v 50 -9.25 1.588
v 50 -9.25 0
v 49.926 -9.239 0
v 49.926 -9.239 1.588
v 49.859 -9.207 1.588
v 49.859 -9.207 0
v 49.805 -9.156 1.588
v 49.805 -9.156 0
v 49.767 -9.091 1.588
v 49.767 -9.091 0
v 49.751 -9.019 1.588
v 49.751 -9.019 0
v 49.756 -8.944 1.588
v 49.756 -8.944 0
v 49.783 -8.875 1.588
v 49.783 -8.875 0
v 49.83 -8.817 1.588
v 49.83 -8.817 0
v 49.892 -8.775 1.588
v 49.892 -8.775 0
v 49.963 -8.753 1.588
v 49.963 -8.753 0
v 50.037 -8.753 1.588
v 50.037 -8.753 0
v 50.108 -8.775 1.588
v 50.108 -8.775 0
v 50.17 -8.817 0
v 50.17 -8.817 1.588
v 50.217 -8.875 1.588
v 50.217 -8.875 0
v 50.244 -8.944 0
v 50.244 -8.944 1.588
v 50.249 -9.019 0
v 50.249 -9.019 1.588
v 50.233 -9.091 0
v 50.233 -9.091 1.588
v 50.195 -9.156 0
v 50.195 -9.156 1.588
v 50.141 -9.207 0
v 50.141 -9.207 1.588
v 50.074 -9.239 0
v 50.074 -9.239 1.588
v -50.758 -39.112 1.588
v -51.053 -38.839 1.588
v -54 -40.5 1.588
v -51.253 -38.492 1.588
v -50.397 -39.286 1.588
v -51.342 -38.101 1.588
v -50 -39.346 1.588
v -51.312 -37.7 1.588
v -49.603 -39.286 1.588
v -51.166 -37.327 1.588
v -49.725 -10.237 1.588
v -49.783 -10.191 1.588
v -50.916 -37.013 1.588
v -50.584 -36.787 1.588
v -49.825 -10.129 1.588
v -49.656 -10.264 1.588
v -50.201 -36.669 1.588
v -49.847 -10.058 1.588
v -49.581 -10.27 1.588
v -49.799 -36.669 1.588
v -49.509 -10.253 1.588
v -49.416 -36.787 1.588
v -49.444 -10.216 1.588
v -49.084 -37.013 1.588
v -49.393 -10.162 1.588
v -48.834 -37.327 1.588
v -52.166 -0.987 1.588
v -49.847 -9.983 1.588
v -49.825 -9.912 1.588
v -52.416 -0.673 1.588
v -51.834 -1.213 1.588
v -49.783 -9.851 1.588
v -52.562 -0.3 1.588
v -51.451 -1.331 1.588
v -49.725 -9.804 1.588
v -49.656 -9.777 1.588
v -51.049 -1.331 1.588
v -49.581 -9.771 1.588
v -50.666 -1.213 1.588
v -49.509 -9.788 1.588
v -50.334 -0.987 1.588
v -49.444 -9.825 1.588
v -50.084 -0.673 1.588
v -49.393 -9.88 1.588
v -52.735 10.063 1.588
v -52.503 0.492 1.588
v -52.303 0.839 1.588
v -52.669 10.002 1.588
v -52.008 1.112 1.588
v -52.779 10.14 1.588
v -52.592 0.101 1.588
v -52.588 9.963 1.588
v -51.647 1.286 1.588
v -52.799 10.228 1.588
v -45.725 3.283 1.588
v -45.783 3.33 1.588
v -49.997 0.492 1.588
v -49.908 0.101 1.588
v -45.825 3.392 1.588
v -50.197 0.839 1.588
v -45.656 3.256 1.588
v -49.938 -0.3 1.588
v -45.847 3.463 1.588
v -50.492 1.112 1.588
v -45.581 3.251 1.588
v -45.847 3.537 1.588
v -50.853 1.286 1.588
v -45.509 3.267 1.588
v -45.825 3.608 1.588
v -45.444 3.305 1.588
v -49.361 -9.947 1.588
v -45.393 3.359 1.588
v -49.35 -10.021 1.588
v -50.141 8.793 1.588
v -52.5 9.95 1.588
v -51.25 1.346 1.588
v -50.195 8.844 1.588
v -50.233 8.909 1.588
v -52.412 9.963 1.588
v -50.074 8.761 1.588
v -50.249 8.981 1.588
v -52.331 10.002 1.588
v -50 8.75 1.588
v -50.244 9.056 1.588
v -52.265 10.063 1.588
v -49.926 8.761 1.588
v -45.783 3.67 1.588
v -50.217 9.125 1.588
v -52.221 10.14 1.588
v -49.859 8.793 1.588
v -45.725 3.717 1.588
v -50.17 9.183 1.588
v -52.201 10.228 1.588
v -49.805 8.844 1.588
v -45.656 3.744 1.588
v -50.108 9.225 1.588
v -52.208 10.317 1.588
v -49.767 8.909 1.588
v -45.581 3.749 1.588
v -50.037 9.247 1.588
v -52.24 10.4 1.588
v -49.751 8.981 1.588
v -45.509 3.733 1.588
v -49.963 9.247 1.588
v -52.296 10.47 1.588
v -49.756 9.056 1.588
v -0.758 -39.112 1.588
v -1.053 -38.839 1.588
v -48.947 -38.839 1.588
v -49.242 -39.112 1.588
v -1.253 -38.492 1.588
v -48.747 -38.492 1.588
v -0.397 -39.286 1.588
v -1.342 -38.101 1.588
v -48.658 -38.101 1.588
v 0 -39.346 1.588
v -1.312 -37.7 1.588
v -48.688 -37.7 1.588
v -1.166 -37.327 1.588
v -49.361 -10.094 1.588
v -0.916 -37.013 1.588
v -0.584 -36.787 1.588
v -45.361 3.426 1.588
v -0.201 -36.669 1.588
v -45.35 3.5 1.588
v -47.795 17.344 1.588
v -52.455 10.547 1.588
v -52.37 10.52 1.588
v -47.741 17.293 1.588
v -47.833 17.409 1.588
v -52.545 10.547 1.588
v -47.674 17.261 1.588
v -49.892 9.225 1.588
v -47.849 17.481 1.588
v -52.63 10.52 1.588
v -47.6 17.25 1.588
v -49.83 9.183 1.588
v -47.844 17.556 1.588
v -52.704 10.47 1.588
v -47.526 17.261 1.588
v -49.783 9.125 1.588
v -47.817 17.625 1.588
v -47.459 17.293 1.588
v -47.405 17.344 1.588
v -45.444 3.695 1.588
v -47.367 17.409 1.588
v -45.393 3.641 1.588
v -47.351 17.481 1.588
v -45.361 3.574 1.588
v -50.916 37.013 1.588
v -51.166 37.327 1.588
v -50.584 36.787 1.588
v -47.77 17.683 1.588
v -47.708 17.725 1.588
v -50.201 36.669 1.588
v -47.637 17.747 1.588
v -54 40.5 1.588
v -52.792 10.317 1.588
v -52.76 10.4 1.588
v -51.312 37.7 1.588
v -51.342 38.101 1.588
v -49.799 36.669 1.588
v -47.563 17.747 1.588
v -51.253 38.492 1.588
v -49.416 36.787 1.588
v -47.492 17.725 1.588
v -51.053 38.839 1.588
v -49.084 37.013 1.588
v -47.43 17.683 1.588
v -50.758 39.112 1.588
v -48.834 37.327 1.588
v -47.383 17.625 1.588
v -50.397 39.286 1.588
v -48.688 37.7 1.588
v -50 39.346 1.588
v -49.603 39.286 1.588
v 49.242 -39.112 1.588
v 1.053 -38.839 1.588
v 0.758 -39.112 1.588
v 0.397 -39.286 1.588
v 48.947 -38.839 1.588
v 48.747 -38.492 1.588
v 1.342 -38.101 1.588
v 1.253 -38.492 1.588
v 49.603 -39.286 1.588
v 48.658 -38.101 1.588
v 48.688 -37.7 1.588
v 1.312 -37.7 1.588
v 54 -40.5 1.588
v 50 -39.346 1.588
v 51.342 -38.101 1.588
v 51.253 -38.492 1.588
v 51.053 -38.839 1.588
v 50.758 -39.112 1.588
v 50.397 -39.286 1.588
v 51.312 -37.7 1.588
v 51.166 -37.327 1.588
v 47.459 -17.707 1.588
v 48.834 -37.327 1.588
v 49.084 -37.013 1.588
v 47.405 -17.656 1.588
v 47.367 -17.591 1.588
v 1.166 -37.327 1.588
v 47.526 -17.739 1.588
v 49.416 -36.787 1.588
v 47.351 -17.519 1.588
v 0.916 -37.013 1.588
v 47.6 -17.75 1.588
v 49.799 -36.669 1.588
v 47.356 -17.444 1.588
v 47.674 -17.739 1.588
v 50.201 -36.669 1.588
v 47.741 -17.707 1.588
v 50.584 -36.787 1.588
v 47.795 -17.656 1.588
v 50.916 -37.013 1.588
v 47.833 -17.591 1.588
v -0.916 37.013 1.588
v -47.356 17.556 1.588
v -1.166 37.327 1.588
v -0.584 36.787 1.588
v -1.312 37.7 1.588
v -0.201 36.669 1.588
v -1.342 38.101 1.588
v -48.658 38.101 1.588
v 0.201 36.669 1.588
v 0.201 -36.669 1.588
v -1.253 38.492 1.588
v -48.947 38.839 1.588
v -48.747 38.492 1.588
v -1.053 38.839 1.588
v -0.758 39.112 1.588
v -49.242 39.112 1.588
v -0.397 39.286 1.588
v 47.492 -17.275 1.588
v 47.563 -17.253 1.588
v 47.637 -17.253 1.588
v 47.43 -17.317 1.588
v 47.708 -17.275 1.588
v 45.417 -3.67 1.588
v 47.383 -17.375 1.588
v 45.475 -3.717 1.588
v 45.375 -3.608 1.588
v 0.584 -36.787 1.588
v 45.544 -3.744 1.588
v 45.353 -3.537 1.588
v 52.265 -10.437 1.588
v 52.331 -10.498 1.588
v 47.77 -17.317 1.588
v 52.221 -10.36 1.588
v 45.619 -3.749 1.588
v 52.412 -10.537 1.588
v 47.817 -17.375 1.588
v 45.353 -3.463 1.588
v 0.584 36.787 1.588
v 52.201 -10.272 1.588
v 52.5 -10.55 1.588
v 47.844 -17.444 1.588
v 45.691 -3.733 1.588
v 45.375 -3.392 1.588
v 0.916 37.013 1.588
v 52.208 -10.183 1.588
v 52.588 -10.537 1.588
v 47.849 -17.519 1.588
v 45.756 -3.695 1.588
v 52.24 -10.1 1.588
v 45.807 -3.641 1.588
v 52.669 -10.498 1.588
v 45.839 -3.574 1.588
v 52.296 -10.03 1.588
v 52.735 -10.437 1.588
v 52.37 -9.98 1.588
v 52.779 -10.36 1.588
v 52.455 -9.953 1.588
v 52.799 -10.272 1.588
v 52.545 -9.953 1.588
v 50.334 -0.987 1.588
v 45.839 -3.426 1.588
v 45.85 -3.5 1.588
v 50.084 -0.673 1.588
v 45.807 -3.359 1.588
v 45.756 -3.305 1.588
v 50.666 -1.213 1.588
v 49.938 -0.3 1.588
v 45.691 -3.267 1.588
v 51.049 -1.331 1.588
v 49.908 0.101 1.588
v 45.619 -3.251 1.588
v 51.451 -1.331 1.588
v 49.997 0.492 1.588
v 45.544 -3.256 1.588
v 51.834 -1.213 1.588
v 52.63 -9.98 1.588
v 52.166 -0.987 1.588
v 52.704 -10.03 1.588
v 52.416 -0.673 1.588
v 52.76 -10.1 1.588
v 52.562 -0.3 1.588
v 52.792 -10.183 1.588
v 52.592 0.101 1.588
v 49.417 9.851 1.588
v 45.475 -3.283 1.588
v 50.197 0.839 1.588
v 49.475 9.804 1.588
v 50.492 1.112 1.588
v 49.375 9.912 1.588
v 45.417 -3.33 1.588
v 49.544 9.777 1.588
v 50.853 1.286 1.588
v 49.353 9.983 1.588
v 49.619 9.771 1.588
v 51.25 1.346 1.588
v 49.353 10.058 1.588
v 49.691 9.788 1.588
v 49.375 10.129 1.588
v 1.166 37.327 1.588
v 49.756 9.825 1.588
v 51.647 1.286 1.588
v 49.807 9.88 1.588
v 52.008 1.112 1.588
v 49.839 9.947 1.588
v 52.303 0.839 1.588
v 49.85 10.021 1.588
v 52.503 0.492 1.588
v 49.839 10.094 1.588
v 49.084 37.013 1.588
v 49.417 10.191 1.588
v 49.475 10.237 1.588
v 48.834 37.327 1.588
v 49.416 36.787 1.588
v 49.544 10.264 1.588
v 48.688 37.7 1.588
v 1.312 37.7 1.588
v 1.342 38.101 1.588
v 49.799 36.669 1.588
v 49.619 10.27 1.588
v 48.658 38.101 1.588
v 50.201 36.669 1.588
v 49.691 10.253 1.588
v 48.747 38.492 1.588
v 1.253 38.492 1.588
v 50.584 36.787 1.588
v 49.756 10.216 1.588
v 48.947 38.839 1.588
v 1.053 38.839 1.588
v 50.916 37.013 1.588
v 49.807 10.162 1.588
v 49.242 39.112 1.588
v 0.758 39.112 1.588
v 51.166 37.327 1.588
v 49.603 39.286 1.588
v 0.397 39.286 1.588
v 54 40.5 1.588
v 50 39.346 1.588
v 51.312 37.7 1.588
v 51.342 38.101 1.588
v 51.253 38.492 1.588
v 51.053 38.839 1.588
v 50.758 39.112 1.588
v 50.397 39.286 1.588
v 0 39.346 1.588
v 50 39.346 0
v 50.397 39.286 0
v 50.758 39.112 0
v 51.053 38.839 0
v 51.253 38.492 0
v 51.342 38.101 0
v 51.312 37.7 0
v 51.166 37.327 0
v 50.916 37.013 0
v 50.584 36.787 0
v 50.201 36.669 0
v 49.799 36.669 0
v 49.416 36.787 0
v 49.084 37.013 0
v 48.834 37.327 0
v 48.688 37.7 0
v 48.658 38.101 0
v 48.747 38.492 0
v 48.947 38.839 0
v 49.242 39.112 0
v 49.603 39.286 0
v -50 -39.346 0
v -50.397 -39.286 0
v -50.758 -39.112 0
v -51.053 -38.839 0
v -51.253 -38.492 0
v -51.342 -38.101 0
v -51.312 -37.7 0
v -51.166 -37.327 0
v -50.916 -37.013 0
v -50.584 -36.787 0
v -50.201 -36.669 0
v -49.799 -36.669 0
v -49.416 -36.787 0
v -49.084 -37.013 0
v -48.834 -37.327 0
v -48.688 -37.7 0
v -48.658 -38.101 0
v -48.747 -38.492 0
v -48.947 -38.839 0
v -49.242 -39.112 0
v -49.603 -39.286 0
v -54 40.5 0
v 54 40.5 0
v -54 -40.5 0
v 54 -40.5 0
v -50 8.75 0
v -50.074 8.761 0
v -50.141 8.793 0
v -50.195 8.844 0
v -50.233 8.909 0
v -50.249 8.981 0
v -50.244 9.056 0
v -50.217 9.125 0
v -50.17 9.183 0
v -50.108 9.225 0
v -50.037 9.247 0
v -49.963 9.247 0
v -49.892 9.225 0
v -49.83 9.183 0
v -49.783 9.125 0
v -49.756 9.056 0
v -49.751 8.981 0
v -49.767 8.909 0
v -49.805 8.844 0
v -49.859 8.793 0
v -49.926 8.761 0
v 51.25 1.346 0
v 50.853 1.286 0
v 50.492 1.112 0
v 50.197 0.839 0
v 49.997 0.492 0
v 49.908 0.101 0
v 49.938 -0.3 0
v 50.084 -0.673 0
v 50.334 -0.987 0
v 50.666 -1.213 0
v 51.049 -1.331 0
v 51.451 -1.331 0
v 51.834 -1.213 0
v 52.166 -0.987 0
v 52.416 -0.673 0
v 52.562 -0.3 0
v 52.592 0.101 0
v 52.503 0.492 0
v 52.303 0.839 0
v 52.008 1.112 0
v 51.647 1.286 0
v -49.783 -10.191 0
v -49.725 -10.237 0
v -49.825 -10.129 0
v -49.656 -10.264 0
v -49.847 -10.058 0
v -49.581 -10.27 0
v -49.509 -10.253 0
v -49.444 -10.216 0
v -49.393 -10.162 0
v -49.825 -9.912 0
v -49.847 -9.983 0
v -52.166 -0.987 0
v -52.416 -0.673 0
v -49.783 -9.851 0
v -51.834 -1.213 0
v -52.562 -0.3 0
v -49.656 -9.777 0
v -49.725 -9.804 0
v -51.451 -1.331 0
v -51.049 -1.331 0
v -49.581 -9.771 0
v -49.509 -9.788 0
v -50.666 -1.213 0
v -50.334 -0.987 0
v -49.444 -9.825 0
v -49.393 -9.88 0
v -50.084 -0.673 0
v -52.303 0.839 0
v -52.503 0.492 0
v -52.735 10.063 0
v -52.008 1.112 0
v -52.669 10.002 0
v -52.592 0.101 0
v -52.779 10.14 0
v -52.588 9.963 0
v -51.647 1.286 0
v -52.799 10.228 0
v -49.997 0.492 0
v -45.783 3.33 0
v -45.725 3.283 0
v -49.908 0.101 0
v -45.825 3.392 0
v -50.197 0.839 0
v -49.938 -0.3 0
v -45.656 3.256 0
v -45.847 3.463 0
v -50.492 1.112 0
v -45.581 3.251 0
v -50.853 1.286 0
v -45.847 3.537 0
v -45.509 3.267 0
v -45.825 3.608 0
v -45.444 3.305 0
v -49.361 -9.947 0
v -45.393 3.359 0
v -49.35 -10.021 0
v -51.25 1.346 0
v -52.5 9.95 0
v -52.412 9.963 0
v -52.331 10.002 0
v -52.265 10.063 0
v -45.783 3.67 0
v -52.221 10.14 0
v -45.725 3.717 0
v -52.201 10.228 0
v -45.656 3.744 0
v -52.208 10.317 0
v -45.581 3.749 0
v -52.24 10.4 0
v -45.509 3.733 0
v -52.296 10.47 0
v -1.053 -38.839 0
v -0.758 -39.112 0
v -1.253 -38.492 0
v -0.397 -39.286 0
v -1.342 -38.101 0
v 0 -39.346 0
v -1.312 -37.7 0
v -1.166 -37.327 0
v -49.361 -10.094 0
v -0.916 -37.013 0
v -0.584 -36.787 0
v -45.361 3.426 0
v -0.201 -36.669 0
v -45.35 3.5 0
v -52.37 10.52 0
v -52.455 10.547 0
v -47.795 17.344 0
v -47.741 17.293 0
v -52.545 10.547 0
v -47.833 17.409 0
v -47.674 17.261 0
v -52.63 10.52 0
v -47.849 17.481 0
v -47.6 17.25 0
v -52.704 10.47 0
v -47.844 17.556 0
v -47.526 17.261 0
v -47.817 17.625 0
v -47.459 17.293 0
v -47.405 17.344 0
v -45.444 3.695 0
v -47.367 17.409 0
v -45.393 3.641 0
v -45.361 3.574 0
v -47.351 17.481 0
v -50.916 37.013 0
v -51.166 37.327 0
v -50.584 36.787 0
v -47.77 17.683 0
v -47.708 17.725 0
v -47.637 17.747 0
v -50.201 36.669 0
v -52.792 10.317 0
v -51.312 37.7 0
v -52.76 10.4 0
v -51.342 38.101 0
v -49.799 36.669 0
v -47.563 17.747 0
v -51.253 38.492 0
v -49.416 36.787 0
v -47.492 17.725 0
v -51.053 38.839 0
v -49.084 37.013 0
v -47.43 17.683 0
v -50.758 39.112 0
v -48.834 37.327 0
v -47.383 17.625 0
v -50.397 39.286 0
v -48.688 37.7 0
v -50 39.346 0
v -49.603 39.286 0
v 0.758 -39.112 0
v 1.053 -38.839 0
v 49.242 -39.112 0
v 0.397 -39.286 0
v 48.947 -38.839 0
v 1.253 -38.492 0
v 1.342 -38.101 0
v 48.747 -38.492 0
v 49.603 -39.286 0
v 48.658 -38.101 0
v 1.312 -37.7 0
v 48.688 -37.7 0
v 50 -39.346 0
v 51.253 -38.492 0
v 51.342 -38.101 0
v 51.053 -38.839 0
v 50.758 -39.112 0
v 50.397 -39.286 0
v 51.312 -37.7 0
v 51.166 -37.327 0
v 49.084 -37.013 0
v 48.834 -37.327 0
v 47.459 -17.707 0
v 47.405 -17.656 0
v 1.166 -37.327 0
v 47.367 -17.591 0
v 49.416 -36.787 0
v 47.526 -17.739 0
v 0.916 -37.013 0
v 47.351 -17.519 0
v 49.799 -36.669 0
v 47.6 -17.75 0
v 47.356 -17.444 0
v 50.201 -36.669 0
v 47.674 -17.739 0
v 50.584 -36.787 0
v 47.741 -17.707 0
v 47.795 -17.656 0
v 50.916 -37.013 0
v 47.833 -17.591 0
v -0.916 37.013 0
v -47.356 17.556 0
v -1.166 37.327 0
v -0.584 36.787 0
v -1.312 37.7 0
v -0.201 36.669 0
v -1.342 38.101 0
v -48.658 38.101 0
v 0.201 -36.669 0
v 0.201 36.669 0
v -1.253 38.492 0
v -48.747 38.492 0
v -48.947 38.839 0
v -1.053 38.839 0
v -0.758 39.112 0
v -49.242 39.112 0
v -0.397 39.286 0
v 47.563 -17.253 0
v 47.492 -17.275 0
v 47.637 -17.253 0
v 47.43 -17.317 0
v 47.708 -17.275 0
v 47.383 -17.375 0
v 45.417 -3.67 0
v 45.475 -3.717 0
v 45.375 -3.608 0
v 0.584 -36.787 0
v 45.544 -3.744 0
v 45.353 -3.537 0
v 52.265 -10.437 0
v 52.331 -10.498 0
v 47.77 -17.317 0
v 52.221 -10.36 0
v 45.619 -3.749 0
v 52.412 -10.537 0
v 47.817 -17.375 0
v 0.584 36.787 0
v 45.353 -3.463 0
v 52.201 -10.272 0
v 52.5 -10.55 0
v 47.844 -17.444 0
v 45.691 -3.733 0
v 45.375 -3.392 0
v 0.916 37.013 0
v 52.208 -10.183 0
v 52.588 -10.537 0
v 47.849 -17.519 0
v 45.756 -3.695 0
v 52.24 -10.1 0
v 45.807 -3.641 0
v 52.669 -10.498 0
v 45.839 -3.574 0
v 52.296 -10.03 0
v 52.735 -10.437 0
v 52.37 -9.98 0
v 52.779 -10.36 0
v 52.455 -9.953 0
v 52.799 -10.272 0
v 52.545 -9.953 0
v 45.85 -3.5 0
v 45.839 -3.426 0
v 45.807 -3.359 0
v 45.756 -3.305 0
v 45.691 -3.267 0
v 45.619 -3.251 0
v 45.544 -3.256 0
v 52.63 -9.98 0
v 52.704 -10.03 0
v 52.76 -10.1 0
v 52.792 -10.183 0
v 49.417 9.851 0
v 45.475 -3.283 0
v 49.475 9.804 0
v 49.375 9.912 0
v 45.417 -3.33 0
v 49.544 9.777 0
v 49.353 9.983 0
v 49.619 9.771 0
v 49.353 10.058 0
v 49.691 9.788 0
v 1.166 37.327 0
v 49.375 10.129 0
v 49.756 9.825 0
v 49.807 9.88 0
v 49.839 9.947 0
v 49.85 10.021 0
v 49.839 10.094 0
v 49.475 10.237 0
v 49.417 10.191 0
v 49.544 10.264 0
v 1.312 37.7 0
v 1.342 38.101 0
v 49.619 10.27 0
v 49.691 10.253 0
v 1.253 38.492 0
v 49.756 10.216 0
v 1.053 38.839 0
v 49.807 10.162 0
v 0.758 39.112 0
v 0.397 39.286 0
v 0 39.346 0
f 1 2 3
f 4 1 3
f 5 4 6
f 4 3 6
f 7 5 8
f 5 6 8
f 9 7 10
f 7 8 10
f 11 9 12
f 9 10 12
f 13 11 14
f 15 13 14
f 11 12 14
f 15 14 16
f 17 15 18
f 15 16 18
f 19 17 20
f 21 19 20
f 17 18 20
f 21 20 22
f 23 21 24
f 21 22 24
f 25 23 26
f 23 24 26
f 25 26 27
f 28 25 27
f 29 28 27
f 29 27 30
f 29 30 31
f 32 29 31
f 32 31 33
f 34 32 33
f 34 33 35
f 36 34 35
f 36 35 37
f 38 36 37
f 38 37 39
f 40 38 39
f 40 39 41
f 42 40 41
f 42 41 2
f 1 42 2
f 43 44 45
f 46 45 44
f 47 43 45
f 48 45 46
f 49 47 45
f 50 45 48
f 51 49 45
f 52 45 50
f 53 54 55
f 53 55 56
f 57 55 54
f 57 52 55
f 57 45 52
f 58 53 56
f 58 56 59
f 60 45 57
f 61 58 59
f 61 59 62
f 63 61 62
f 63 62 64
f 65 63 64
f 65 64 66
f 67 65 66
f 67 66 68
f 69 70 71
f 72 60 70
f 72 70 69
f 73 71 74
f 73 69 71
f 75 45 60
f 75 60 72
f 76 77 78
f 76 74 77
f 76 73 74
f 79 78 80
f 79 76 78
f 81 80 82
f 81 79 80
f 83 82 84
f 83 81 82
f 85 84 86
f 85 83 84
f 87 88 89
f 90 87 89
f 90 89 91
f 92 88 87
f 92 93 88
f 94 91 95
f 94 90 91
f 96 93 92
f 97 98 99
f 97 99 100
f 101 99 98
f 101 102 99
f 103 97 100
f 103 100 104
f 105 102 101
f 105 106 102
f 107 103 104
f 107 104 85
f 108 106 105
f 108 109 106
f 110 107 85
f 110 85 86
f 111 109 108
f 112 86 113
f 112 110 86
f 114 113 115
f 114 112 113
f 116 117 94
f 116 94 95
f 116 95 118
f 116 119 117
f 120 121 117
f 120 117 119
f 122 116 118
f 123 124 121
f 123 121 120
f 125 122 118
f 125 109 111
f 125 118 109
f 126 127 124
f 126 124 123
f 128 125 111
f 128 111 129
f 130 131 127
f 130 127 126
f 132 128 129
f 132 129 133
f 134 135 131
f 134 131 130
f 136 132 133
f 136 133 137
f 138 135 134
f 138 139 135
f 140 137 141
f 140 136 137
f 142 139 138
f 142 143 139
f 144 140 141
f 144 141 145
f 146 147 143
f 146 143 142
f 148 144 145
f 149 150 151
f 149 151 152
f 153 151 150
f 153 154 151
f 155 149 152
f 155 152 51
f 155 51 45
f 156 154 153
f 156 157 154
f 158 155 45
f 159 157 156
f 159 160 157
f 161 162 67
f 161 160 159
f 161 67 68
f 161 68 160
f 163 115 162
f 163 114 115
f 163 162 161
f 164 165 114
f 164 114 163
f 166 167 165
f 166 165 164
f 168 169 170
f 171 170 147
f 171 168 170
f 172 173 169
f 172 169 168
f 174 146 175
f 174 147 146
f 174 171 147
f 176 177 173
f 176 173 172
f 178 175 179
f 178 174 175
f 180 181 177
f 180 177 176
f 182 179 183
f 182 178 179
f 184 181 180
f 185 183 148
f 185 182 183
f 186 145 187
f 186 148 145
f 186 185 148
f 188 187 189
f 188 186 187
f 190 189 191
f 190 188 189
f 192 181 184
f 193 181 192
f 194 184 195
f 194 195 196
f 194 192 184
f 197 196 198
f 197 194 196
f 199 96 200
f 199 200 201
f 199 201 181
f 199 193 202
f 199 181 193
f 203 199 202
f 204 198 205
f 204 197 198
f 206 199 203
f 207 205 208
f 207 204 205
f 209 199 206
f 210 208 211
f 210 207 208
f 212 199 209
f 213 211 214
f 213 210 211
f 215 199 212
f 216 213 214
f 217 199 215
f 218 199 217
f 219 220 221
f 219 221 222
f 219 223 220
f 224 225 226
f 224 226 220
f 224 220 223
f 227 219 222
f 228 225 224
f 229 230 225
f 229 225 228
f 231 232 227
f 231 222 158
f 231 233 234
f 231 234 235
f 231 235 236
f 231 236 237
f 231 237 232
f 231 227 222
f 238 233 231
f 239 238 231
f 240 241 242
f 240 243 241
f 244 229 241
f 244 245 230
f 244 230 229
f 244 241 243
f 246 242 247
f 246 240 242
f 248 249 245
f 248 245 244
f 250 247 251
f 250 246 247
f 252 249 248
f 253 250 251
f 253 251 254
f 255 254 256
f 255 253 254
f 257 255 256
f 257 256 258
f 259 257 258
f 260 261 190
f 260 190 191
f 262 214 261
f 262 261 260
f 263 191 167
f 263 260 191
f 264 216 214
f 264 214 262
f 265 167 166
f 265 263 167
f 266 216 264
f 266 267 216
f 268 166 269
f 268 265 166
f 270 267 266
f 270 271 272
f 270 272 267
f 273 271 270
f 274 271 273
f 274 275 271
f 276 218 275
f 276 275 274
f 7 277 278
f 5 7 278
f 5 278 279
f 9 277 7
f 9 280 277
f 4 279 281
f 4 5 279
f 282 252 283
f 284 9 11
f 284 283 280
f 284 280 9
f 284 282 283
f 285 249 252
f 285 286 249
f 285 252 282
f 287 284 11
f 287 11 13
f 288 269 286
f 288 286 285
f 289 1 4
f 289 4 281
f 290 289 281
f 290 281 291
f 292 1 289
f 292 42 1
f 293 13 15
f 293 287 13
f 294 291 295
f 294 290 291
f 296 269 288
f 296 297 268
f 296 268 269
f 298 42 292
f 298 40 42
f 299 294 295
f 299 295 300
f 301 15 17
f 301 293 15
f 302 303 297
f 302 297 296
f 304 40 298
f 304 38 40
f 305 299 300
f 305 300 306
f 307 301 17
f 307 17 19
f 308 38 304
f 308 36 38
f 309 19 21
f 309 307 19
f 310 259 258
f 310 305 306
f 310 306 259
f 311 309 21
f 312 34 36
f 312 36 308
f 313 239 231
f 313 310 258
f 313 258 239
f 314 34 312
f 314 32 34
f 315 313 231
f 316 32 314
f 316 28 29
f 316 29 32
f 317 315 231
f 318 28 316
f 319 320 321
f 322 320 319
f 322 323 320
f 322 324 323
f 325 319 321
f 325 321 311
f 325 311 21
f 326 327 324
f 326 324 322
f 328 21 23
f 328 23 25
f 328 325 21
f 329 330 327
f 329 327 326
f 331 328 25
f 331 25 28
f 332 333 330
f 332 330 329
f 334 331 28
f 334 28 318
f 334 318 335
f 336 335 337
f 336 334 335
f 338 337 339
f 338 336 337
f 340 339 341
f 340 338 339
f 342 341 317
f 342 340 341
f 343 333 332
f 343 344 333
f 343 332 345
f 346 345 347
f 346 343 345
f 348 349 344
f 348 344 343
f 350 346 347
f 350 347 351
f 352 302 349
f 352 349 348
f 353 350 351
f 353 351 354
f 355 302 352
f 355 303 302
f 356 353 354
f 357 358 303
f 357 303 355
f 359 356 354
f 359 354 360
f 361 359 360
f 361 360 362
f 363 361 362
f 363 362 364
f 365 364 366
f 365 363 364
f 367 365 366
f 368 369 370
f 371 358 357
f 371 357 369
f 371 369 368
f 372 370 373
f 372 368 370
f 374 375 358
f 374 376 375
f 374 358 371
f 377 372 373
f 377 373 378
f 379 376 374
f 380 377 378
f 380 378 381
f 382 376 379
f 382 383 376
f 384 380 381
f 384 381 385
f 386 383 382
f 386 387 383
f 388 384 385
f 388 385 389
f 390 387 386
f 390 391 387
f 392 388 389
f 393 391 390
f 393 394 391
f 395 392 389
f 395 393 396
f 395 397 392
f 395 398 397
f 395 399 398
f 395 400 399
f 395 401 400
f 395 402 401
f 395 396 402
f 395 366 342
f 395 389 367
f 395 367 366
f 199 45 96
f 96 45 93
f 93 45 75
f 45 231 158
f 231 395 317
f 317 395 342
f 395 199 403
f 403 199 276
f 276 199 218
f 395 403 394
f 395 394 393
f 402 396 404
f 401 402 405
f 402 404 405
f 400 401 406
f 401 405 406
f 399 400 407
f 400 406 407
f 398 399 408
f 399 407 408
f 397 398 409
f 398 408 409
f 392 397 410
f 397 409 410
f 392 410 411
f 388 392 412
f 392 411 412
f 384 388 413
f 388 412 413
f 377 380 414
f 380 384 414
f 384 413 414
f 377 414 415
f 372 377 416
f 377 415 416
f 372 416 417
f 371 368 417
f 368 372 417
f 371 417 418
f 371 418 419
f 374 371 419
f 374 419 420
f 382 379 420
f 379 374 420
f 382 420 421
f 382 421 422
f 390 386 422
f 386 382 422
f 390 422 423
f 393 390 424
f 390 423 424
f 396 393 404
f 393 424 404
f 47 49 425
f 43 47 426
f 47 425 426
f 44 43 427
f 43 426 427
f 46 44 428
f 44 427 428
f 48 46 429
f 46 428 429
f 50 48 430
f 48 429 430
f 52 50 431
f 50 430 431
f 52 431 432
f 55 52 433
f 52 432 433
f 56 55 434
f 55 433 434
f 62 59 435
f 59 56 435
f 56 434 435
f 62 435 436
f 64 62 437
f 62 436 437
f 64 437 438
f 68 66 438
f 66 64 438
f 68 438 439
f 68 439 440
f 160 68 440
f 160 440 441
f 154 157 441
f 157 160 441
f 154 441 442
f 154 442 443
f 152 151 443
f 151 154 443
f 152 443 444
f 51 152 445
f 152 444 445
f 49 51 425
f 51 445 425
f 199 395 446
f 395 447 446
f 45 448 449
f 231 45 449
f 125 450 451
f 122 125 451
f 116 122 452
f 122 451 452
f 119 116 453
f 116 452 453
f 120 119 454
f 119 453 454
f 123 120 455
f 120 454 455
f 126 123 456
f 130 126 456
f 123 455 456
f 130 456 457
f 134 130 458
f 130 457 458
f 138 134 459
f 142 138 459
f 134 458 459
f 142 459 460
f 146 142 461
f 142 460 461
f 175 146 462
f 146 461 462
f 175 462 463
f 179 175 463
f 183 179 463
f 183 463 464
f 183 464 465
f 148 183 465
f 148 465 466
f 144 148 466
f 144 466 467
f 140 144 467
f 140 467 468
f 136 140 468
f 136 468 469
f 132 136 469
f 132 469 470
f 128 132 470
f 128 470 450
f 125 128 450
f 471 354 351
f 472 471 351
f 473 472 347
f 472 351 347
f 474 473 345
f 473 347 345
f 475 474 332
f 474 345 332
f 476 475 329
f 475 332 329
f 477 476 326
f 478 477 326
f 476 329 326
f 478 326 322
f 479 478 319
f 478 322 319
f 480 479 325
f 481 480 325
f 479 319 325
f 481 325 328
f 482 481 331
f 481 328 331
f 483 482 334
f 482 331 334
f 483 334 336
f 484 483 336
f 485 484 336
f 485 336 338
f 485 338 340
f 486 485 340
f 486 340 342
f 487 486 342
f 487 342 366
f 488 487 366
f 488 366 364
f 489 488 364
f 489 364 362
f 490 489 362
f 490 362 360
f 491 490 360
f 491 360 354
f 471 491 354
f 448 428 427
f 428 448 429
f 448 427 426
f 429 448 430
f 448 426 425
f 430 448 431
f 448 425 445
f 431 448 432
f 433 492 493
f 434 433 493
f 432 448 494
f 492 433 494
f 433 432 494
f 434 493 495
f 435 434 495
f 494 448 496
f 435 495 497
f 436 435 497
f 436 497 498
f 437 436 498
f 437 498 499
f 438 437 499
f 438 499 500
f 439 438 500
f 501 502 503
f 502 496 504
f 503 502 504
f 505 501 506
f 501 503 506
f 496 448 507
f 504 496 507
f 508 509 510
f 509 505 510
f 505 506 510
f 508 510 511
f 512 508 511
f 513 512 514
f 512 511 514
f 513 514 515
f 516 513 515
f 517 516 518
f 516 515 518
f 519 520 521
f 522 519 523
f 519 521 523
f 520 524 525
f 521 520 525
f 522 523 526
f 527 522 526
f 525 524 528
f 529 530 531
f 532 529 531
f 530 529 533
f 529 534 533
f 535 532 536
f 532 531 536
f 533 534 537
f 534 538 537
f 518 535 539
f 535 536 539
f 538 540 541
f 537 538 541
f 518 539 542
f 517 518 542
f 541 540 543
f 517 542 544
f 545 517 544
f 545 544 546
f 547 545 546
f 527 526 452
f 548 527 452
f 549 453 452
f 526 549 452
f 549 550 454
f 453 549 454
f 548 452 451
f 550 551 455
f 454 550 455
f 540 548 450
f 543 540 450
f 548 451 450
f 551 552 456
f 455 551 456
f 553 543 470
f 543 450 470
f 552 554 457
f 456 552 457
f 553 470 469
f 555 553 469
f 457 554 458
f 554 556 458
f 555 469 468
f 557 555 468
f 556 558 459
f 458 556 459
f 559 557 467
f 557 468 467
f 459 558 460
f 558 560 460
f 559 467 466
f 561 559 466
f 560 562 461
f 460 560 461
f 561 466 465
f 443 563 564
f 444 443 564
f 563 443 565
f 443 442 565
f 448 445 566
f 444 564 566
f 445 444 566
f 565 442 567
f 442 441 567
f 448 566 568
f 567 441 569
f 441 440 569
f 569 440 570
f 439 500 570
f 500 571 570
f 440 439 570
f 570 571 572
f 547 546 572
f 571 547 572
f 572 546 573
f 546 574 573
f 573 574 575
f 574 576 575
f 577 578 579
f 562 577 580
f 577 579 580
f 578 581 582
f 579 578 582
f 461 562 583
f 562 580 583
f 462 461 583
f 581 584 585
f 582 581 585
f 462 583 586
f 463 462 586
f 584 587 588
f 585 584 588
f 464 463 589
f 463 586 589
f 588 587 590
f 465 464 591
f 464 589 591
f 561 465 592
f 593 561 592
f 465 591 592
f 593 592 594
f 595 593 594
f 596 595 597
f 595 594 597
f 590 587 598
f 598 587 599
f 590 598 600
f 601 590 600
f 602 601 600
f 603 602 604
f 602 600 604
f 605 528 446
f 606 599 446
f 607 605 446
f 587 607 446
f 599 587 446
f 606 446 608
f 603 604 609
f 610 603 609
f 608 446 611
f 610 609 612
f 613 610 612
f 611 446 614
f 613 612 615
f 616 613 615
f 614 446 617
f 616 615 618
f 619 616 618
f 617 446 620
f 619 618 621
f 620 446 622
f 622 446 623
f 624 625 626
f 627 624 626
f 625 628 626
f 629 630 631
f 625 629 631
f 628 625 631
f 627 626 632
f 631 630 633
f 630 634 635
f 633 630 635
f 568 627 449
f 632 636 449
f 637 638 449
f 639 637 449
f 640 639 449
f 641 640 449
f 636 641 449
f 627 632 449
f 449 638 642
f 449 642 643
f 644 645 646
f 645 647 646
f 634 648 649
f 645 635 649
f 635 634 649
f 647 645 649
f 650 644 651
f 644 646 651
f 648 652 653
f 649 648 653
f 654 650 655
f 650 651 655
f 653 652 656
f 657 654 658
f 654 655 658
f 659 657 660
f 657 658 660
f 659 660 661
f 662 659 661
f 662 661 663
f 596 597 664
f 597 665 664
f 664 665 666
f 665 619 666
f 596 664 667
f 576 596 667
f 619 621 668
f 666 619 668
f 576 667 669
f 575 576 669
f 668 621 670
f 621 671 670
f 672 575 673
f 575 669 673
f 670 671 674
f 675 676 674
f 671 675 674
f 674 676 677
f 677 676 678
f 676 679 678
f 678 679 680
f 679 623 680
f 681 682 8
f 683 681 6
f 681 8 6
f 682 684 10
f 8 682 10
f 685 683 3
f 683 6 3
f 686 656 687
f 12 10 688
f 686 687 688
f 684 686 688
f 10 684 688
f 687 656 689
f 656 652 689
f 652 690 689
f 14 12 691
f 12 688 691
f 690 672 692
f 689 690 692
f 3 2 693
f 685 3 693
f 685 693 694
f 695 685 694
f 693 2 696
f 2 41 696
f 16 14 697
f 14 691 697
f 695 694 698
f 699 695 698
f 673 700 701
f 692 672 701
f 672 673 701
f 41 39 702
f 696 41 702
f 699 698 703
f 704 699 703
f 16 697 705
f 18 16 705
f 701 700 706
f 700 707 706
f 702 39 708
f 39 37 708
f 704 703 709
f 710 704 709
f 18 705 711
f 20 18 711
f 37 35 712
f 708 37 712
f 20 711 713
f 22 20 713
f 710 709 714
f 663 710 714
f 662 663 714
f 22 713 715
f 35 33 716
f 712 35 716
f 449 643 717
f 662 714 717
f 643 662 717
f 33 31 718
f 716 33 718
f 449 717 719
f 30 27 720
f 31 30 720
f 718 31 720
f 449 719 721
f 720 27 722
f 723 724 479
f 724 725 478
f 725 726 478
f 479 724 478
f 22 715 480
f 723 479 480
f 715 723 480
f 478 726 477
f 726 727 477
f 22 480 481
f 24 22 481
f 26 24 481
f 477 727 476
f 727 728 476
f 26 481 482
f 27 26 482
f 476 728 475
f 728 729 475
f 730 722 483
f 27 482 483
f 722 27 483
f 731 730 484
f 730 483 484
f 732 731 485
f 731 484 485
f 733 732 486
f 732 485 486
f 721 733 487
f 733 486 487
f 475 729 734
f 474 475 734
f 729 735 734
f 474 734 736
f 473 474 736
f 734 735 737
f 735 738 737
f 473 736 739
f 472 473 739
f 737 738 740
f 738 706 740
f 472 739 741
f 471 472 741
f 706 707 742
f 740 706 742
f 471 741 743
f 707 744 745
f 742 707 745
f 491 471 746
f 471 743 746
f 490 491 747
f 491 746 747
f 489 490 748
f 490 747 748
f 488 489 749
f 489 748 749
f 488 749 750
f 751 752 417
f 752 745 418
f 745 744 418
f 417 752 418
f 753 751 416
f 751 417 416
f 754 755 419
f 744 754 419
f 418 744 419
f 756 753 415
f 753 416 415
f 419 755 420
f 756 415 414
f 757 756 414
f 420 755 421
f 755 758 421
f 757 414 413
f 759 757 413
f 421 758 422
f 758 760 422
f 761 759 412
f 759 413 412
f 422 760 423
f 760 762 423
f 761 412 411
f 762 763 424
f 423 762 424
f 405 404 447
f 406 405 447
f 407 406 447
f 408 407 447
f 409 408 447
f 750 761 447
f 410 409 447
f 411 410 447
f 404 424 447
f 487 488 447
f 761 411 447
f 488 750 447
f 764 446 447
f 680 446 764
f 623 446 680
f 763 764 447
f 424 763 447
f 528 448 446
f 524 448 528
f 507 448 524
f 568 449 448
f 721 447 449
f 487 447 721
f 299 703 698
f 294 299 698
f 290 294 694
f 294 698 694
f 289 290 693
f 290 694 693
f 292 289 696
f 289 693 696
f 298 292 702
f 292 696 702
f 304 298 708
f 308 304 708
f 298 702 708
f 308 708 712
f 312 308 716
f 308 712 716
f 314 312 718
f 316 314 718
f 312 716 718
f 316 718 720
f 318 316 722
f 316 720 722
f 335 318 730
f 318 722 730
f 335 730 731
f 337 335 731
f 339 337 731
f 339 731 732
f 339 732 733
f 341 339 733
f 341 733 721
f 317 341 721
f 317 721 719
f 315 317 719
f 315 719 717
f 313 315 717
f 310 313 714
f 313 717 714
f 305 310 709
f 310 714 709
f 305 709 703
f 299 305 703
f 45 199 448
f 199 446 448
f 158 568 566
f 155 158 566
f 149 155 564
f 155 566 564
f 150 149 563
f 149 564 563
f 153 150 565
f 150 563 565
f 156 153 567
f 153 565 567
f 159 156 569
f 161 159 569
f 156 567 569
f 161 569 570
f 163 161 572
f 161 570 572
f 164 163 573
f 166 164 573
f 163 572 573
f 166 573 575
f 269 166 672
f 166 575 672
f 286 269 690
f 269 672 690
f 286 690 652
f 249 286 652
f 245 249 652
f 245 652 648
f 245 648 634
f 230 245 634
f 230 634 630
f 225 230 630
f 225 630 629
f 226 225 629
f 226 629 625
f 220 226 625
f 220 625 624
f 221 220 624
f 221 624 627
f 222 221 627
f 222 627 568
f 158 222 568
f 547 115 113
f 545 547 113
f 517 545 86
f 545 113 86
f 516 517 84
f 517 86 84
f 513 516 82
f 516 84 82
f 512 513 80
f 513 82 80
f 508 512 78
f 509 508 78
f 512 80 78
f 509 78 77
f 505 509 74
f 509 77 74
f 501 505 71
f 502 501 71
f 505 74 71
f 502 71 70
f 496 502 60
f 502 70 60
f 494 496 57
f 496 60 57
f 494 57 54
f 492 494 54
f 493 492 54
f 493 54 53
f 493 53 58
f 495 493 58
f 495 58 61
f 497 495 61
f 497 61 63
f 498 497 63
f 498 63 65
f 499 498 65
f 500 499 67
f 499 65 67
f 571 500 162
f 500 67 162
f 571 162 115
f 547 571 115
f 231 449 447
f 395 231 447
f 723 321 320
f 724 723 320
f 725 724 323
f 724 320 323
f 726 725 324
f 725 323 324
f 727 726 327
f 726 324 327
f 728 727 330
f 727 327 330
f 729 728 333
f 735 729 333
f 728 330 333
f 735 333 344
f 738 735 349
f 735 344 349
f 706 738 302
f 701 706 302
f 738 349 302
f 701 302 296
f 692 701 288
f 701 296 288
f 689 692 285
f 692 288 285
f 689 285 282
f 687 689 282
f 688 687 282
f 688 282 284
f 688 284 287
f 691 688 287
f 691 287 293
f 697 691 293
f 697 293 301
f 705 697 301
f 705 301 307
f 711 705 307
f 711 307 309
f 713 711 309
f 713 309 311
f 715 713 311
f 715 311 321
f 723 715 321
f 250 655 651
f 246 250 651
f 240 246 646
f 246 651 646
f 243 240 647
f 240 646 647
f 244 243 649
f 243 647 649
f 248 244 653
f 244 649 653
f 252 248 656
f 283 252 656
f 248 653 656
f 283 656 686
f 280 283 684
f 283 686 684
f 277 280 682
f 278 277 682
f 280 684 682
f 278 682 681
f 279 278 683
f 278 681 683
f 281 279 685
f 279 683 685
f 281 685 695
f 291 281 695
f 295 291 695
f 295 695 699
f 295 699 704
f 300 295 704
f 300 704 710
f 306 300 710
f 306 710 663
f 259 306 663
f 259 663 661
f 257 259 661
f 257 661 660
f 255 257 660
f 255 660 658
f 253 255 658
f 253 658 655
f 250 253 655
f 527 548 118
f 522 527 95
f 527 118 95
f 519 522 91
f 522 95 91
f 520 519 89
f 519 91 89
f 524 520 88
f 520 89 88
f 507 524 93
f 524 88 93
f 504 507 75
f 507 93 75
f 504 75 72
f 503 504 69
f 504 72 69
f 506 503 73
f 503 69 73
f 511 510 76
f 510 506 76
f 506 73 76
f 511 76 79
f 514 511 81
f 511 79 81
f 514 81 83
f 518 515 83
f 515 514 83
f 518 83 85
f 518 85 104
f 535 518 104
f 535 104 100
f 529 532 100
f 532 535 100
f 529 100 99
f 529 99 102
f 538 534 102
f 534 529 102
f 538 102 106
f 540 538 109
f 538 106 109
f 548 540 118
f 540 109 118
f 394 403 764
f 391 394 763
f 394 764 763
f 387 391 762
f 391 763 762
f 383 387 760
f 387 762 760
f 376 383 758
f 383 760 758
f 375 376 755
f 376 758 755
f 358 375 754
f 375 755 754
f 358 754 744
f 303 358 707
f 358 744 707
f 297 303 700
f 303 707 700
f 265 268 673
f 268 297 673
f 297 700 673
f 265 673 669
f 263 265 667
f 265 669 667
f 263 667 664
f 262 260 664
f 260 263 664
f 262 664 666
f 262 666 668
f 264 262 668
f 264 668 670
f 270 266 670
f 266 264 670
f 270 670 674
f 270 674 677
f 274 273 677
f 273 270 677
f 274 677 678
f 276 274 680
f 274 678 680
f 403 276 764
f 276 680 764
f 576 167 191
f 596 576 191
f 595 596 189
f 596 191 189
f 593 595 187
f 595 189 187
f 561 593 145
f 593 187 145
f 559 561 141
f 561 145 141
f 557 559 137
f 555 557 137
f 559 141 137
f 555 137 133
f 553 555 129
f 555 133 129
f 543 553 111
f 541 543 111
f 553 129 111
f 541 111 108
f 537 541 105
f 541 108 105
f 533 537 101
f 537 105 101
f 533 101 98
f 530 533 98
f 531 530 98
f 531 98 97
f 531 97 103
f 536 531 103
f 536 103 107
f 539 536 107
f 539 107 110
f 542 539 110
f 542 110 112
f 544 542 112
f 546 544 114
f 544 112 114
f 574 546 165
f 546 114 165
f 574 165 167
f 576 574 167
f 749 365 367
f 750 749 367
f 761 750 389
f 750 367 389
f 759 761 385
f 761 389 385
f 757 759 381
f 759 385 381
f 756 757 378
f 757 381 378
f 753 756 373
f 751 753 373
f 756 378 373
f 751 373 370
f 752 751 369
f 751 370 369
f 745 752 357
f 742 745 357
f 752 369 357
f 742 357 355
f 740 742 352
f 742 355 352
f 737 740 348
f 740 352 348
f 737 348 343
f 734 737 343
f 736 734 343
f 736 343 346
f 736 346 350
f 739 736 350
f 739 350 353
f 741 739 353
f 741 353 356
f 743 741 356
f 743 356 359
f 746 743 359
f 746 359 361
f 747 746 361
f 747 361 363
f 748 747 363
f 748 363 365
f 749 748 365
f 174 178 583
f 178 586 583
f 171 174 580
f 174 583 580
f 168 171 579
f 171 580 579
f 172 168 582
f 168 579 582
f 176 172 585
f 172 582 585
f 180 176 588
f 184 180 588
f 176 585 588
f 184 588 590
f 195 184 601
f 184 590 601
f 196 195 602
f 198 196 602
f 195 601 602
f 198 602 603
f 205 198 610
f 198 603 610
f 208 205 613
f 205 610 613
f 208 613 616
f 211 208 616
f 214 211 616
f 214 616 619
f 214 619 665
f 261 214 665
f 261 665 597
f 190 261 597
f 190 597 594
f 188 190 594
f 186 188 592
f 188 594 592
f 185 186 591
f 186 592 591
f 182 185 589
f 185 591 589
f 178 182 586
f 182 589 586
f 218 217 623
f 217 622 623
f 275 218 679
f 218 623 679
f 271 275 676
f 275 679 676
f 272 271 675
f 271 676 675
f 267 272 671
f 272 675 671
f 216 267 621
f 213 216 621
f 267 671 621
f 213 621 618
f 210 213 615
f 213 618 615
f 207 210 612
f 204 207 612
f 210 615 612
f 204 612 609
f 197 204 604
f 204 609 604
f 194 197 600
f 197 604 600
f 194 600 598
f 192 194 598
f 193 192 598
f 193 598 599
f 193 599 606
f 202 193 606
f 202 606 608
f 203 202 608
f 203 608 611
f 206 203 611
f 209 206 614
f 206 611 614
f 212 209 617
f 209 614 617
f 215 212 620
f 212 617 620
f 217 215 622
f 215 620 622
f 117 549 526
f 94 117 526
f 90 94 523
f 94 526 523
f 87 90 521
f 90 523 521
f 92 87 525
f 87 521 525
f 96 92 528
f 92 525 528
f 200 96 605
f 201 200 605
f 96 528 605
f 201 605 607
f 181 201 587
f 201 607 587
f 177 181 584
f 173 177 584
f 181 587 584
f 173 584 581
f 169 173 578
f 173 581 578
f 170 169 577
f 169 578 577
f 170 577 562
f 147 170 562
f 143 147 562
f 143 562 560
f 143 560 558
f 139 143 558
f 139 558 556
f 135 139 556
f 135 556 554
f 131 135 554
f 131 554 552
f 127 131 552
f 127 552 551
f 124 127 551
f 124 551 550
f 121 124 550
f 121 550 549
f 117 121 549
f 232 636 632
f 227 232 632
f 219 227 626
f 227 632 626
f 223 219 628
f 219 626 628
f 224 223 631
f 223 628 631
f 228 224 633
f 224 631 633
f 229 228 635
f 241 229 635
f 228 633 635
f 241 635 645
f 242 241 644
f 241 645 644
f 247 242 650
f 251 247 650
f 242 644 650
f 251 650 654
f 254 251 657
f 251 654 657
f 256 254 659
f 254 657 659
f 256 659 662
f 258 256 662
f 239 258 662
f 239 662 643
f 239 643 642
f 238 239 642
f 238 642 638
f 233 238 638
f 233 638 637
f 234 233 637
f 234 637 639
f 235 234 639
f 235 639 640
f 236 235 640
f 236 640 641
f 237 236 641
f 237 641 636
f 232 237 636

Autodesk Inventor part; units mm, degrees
ref_plane "YZ Plane" through (0, 0, 0) normal (1, 0, 0) x (0, 1, 0)
ref_plane "XZ Plane" through (0, 0, 0) normal (0, 1, 0) x (-1, 0, 0)
ref_plane "XY Plane" through (0, 0, 0) normal (0, 0, 1) x (1, 0, 0)
sketch "Sketch1" plane through (0, 0, 0) normal (0, 0, 1) x (1, 0, 0)
  line L0 (-54, -40.5) -> (54, -40.5)
  line L1 (54, -40.5) -> (54, 40.5)
  line L2 (54, 40.5) -> (-54, 40.5)
  line L3 (-54, 40.5) -> (-54, -40.5)
  point P0 (0, 0)
  dimension "d0" = 108
  dimension "d1" = 81
  dimension "d2" = 40.5
  dimension "d3" = 54
extrude "Extrusion1" add sketch "Sketch1" along normal blind 1.5875
hole "Hole2" at (50, -38, 1.5875) direction (0, 0, -1) diameter 2.6924 end through all
mirror "Mirror1" about plane through (0, 0, 0) normal (0, 1, 0) of "Hole2"
hole "Hole3" [suppressed]
hole "Hole4" [suppressed]
mirror "Mirror2" about plane through (0, 0, 0) normal (1, 0, 0) of "Hole2", "Mirror1"
hole "Hole5" at (0, -38, 1.5875) direction (0, 0, -1) diameter 2.6924 end through all
mirror "Mirror3" about plane through (0, 0, 0) normal (0, 1, 0) of "Hole5"
hole "Hole6" at (51.25, 0, 0) direction (0, 0, 1) diameter 2.6924 end through all
mirror "Mirror4" about plane through (0, 0, 0) normal (1, 0, 0) of "Hole6"
hole "Hole_spring" at (-47.6, 17.5, 1.5875) direction (0, 0, -1) diameter 0.5 end through all
sketch "Sketch3" plane through (0, 0, 1.5875) normal (0, 0, 1) x (1, 0, 0)
  line L0 (-54, -40.5) -> (-54, 40.5) projected
  line L1 (-54, 40.5) -> (54, 40.5) projected
  line L2 (-47.6, 9.8024) -> (-47.6, -15.4623) construction
  circle A0 centre (-45.6, 3.5) radius 0.25
  circle A1 centre (-49.6, -10.0207) radius 0.25
  point P0 (0, 0)
  point P1 (-46.1616, -3.6859)
  dimension "d243" = 6.4
  dimension "d244" = 2
  dimension "d245" = 2
  dimension "d246" = 14.1
  dimension "d247" = 0.5
  dimension "d248" = 37
extrude "Holes_resistor" cut sketch "Sketch3" against normal through all
hole "Hole_via" at (-50, 9, 1.5875) direction (0, 0, -1) diameter 0.5 end through all
hole "Hole_spring_2" at (47.6, -17.5, 1.5875) direction (0, 0, -1) diameter 0.5 end through all
sketch "Sketch5" plane through (0, 0, 1.5875) normal (0, 0, 1) x (1, 0, 0)
  line L0 (54, -40.5) -> (-54, -40.5) projected
  line L1 (54, 40.5) -> (54, -40.5) projected
  line L2 (47.6, -11.3866) -> (47.6, 14.8402) construction
  circle A0 centre (49.6, 10.0207) radius 0.25
  circle A1 centre (45.6, -3.5) radius 0.25
  point P0 (0, 0)
  dimension "d271" = 6.4
  dimension "d272" = 2
  dimension "d273" = 2
  dimension "d274" = 0.5
  dimension "d275" = 14.1
  dimension "d276" = 37
extrude "Holes_resistor2" cut sketch "Sketch5" against normal through all
hole "Hole_via2" at (50, -9, 1.5875) direction (0, 0, -1) diameter 0.5 end through all
hole "Hole26" at (-52.5, 10.25, 1.5875) direction (0, 0, -1) diameter 0.6 end through all
hole "Hole27" at (52.5, -10.25, 1.5875) direction (0, 0, -1) diameter 0.6 end through all
sketch "Sketch8" plane through (0, 0, 1.5875) normal (0, 0, 1) x (1, 0, 0)
  line L0 (-54, -40.5) -> (-54, 40.5) projected
  line L1 (54, -40.5) -> (-54, -40.5) projected
  line L2 (54, 40.5) -> (54, -40.5) projected
  line L3 (-54, 40.5) -> (54, 40.5) projected
  line L4 (54.0603, -40.4195) -> (-54, -40.5) construction
  line L5 (-54, -40.5) -> (-54.0603, 40.4195) construction
  line L6 (-54.0603, 40.4195) -> (54, 40.5) construction
  line L7 (54, 40.5) -> (54.0603, -40.4195) construction
  point P0 (0, 0)
decal "Decal3"
sketch "Sketch9" plane through (0, 0, 0) normal (0, 0, -1) x (-1, 0, 0)
  line L0 (54, -40.5) -> (-54, -40.5) projected
  line L1 (54, 40.5) -> (54, -40.5) projected
  line L2 (-54, 40.5) -> (54, 40.5) projected
  line L3 (-54, -40.5) -> (-54, 40.5) projected
  line L4 (54.0603, -40.4195) -> (-54, -40.5) construction
  line L5 (-54, -40.5) -> (-54.0603, 40.4195) construction
  line L6 (-54.0603, 40.4195) -> (54, 40.5) construction
  line L7 (54, 40.5) -> (54.0603, -40.4195) construction
  point P0 (0, 0)
decal "Decal4"
equation "\"d283\" = d253"
equation "\"d253\" = 0.5"
properties part number "FOX-ME-127-05" material "FR4"
